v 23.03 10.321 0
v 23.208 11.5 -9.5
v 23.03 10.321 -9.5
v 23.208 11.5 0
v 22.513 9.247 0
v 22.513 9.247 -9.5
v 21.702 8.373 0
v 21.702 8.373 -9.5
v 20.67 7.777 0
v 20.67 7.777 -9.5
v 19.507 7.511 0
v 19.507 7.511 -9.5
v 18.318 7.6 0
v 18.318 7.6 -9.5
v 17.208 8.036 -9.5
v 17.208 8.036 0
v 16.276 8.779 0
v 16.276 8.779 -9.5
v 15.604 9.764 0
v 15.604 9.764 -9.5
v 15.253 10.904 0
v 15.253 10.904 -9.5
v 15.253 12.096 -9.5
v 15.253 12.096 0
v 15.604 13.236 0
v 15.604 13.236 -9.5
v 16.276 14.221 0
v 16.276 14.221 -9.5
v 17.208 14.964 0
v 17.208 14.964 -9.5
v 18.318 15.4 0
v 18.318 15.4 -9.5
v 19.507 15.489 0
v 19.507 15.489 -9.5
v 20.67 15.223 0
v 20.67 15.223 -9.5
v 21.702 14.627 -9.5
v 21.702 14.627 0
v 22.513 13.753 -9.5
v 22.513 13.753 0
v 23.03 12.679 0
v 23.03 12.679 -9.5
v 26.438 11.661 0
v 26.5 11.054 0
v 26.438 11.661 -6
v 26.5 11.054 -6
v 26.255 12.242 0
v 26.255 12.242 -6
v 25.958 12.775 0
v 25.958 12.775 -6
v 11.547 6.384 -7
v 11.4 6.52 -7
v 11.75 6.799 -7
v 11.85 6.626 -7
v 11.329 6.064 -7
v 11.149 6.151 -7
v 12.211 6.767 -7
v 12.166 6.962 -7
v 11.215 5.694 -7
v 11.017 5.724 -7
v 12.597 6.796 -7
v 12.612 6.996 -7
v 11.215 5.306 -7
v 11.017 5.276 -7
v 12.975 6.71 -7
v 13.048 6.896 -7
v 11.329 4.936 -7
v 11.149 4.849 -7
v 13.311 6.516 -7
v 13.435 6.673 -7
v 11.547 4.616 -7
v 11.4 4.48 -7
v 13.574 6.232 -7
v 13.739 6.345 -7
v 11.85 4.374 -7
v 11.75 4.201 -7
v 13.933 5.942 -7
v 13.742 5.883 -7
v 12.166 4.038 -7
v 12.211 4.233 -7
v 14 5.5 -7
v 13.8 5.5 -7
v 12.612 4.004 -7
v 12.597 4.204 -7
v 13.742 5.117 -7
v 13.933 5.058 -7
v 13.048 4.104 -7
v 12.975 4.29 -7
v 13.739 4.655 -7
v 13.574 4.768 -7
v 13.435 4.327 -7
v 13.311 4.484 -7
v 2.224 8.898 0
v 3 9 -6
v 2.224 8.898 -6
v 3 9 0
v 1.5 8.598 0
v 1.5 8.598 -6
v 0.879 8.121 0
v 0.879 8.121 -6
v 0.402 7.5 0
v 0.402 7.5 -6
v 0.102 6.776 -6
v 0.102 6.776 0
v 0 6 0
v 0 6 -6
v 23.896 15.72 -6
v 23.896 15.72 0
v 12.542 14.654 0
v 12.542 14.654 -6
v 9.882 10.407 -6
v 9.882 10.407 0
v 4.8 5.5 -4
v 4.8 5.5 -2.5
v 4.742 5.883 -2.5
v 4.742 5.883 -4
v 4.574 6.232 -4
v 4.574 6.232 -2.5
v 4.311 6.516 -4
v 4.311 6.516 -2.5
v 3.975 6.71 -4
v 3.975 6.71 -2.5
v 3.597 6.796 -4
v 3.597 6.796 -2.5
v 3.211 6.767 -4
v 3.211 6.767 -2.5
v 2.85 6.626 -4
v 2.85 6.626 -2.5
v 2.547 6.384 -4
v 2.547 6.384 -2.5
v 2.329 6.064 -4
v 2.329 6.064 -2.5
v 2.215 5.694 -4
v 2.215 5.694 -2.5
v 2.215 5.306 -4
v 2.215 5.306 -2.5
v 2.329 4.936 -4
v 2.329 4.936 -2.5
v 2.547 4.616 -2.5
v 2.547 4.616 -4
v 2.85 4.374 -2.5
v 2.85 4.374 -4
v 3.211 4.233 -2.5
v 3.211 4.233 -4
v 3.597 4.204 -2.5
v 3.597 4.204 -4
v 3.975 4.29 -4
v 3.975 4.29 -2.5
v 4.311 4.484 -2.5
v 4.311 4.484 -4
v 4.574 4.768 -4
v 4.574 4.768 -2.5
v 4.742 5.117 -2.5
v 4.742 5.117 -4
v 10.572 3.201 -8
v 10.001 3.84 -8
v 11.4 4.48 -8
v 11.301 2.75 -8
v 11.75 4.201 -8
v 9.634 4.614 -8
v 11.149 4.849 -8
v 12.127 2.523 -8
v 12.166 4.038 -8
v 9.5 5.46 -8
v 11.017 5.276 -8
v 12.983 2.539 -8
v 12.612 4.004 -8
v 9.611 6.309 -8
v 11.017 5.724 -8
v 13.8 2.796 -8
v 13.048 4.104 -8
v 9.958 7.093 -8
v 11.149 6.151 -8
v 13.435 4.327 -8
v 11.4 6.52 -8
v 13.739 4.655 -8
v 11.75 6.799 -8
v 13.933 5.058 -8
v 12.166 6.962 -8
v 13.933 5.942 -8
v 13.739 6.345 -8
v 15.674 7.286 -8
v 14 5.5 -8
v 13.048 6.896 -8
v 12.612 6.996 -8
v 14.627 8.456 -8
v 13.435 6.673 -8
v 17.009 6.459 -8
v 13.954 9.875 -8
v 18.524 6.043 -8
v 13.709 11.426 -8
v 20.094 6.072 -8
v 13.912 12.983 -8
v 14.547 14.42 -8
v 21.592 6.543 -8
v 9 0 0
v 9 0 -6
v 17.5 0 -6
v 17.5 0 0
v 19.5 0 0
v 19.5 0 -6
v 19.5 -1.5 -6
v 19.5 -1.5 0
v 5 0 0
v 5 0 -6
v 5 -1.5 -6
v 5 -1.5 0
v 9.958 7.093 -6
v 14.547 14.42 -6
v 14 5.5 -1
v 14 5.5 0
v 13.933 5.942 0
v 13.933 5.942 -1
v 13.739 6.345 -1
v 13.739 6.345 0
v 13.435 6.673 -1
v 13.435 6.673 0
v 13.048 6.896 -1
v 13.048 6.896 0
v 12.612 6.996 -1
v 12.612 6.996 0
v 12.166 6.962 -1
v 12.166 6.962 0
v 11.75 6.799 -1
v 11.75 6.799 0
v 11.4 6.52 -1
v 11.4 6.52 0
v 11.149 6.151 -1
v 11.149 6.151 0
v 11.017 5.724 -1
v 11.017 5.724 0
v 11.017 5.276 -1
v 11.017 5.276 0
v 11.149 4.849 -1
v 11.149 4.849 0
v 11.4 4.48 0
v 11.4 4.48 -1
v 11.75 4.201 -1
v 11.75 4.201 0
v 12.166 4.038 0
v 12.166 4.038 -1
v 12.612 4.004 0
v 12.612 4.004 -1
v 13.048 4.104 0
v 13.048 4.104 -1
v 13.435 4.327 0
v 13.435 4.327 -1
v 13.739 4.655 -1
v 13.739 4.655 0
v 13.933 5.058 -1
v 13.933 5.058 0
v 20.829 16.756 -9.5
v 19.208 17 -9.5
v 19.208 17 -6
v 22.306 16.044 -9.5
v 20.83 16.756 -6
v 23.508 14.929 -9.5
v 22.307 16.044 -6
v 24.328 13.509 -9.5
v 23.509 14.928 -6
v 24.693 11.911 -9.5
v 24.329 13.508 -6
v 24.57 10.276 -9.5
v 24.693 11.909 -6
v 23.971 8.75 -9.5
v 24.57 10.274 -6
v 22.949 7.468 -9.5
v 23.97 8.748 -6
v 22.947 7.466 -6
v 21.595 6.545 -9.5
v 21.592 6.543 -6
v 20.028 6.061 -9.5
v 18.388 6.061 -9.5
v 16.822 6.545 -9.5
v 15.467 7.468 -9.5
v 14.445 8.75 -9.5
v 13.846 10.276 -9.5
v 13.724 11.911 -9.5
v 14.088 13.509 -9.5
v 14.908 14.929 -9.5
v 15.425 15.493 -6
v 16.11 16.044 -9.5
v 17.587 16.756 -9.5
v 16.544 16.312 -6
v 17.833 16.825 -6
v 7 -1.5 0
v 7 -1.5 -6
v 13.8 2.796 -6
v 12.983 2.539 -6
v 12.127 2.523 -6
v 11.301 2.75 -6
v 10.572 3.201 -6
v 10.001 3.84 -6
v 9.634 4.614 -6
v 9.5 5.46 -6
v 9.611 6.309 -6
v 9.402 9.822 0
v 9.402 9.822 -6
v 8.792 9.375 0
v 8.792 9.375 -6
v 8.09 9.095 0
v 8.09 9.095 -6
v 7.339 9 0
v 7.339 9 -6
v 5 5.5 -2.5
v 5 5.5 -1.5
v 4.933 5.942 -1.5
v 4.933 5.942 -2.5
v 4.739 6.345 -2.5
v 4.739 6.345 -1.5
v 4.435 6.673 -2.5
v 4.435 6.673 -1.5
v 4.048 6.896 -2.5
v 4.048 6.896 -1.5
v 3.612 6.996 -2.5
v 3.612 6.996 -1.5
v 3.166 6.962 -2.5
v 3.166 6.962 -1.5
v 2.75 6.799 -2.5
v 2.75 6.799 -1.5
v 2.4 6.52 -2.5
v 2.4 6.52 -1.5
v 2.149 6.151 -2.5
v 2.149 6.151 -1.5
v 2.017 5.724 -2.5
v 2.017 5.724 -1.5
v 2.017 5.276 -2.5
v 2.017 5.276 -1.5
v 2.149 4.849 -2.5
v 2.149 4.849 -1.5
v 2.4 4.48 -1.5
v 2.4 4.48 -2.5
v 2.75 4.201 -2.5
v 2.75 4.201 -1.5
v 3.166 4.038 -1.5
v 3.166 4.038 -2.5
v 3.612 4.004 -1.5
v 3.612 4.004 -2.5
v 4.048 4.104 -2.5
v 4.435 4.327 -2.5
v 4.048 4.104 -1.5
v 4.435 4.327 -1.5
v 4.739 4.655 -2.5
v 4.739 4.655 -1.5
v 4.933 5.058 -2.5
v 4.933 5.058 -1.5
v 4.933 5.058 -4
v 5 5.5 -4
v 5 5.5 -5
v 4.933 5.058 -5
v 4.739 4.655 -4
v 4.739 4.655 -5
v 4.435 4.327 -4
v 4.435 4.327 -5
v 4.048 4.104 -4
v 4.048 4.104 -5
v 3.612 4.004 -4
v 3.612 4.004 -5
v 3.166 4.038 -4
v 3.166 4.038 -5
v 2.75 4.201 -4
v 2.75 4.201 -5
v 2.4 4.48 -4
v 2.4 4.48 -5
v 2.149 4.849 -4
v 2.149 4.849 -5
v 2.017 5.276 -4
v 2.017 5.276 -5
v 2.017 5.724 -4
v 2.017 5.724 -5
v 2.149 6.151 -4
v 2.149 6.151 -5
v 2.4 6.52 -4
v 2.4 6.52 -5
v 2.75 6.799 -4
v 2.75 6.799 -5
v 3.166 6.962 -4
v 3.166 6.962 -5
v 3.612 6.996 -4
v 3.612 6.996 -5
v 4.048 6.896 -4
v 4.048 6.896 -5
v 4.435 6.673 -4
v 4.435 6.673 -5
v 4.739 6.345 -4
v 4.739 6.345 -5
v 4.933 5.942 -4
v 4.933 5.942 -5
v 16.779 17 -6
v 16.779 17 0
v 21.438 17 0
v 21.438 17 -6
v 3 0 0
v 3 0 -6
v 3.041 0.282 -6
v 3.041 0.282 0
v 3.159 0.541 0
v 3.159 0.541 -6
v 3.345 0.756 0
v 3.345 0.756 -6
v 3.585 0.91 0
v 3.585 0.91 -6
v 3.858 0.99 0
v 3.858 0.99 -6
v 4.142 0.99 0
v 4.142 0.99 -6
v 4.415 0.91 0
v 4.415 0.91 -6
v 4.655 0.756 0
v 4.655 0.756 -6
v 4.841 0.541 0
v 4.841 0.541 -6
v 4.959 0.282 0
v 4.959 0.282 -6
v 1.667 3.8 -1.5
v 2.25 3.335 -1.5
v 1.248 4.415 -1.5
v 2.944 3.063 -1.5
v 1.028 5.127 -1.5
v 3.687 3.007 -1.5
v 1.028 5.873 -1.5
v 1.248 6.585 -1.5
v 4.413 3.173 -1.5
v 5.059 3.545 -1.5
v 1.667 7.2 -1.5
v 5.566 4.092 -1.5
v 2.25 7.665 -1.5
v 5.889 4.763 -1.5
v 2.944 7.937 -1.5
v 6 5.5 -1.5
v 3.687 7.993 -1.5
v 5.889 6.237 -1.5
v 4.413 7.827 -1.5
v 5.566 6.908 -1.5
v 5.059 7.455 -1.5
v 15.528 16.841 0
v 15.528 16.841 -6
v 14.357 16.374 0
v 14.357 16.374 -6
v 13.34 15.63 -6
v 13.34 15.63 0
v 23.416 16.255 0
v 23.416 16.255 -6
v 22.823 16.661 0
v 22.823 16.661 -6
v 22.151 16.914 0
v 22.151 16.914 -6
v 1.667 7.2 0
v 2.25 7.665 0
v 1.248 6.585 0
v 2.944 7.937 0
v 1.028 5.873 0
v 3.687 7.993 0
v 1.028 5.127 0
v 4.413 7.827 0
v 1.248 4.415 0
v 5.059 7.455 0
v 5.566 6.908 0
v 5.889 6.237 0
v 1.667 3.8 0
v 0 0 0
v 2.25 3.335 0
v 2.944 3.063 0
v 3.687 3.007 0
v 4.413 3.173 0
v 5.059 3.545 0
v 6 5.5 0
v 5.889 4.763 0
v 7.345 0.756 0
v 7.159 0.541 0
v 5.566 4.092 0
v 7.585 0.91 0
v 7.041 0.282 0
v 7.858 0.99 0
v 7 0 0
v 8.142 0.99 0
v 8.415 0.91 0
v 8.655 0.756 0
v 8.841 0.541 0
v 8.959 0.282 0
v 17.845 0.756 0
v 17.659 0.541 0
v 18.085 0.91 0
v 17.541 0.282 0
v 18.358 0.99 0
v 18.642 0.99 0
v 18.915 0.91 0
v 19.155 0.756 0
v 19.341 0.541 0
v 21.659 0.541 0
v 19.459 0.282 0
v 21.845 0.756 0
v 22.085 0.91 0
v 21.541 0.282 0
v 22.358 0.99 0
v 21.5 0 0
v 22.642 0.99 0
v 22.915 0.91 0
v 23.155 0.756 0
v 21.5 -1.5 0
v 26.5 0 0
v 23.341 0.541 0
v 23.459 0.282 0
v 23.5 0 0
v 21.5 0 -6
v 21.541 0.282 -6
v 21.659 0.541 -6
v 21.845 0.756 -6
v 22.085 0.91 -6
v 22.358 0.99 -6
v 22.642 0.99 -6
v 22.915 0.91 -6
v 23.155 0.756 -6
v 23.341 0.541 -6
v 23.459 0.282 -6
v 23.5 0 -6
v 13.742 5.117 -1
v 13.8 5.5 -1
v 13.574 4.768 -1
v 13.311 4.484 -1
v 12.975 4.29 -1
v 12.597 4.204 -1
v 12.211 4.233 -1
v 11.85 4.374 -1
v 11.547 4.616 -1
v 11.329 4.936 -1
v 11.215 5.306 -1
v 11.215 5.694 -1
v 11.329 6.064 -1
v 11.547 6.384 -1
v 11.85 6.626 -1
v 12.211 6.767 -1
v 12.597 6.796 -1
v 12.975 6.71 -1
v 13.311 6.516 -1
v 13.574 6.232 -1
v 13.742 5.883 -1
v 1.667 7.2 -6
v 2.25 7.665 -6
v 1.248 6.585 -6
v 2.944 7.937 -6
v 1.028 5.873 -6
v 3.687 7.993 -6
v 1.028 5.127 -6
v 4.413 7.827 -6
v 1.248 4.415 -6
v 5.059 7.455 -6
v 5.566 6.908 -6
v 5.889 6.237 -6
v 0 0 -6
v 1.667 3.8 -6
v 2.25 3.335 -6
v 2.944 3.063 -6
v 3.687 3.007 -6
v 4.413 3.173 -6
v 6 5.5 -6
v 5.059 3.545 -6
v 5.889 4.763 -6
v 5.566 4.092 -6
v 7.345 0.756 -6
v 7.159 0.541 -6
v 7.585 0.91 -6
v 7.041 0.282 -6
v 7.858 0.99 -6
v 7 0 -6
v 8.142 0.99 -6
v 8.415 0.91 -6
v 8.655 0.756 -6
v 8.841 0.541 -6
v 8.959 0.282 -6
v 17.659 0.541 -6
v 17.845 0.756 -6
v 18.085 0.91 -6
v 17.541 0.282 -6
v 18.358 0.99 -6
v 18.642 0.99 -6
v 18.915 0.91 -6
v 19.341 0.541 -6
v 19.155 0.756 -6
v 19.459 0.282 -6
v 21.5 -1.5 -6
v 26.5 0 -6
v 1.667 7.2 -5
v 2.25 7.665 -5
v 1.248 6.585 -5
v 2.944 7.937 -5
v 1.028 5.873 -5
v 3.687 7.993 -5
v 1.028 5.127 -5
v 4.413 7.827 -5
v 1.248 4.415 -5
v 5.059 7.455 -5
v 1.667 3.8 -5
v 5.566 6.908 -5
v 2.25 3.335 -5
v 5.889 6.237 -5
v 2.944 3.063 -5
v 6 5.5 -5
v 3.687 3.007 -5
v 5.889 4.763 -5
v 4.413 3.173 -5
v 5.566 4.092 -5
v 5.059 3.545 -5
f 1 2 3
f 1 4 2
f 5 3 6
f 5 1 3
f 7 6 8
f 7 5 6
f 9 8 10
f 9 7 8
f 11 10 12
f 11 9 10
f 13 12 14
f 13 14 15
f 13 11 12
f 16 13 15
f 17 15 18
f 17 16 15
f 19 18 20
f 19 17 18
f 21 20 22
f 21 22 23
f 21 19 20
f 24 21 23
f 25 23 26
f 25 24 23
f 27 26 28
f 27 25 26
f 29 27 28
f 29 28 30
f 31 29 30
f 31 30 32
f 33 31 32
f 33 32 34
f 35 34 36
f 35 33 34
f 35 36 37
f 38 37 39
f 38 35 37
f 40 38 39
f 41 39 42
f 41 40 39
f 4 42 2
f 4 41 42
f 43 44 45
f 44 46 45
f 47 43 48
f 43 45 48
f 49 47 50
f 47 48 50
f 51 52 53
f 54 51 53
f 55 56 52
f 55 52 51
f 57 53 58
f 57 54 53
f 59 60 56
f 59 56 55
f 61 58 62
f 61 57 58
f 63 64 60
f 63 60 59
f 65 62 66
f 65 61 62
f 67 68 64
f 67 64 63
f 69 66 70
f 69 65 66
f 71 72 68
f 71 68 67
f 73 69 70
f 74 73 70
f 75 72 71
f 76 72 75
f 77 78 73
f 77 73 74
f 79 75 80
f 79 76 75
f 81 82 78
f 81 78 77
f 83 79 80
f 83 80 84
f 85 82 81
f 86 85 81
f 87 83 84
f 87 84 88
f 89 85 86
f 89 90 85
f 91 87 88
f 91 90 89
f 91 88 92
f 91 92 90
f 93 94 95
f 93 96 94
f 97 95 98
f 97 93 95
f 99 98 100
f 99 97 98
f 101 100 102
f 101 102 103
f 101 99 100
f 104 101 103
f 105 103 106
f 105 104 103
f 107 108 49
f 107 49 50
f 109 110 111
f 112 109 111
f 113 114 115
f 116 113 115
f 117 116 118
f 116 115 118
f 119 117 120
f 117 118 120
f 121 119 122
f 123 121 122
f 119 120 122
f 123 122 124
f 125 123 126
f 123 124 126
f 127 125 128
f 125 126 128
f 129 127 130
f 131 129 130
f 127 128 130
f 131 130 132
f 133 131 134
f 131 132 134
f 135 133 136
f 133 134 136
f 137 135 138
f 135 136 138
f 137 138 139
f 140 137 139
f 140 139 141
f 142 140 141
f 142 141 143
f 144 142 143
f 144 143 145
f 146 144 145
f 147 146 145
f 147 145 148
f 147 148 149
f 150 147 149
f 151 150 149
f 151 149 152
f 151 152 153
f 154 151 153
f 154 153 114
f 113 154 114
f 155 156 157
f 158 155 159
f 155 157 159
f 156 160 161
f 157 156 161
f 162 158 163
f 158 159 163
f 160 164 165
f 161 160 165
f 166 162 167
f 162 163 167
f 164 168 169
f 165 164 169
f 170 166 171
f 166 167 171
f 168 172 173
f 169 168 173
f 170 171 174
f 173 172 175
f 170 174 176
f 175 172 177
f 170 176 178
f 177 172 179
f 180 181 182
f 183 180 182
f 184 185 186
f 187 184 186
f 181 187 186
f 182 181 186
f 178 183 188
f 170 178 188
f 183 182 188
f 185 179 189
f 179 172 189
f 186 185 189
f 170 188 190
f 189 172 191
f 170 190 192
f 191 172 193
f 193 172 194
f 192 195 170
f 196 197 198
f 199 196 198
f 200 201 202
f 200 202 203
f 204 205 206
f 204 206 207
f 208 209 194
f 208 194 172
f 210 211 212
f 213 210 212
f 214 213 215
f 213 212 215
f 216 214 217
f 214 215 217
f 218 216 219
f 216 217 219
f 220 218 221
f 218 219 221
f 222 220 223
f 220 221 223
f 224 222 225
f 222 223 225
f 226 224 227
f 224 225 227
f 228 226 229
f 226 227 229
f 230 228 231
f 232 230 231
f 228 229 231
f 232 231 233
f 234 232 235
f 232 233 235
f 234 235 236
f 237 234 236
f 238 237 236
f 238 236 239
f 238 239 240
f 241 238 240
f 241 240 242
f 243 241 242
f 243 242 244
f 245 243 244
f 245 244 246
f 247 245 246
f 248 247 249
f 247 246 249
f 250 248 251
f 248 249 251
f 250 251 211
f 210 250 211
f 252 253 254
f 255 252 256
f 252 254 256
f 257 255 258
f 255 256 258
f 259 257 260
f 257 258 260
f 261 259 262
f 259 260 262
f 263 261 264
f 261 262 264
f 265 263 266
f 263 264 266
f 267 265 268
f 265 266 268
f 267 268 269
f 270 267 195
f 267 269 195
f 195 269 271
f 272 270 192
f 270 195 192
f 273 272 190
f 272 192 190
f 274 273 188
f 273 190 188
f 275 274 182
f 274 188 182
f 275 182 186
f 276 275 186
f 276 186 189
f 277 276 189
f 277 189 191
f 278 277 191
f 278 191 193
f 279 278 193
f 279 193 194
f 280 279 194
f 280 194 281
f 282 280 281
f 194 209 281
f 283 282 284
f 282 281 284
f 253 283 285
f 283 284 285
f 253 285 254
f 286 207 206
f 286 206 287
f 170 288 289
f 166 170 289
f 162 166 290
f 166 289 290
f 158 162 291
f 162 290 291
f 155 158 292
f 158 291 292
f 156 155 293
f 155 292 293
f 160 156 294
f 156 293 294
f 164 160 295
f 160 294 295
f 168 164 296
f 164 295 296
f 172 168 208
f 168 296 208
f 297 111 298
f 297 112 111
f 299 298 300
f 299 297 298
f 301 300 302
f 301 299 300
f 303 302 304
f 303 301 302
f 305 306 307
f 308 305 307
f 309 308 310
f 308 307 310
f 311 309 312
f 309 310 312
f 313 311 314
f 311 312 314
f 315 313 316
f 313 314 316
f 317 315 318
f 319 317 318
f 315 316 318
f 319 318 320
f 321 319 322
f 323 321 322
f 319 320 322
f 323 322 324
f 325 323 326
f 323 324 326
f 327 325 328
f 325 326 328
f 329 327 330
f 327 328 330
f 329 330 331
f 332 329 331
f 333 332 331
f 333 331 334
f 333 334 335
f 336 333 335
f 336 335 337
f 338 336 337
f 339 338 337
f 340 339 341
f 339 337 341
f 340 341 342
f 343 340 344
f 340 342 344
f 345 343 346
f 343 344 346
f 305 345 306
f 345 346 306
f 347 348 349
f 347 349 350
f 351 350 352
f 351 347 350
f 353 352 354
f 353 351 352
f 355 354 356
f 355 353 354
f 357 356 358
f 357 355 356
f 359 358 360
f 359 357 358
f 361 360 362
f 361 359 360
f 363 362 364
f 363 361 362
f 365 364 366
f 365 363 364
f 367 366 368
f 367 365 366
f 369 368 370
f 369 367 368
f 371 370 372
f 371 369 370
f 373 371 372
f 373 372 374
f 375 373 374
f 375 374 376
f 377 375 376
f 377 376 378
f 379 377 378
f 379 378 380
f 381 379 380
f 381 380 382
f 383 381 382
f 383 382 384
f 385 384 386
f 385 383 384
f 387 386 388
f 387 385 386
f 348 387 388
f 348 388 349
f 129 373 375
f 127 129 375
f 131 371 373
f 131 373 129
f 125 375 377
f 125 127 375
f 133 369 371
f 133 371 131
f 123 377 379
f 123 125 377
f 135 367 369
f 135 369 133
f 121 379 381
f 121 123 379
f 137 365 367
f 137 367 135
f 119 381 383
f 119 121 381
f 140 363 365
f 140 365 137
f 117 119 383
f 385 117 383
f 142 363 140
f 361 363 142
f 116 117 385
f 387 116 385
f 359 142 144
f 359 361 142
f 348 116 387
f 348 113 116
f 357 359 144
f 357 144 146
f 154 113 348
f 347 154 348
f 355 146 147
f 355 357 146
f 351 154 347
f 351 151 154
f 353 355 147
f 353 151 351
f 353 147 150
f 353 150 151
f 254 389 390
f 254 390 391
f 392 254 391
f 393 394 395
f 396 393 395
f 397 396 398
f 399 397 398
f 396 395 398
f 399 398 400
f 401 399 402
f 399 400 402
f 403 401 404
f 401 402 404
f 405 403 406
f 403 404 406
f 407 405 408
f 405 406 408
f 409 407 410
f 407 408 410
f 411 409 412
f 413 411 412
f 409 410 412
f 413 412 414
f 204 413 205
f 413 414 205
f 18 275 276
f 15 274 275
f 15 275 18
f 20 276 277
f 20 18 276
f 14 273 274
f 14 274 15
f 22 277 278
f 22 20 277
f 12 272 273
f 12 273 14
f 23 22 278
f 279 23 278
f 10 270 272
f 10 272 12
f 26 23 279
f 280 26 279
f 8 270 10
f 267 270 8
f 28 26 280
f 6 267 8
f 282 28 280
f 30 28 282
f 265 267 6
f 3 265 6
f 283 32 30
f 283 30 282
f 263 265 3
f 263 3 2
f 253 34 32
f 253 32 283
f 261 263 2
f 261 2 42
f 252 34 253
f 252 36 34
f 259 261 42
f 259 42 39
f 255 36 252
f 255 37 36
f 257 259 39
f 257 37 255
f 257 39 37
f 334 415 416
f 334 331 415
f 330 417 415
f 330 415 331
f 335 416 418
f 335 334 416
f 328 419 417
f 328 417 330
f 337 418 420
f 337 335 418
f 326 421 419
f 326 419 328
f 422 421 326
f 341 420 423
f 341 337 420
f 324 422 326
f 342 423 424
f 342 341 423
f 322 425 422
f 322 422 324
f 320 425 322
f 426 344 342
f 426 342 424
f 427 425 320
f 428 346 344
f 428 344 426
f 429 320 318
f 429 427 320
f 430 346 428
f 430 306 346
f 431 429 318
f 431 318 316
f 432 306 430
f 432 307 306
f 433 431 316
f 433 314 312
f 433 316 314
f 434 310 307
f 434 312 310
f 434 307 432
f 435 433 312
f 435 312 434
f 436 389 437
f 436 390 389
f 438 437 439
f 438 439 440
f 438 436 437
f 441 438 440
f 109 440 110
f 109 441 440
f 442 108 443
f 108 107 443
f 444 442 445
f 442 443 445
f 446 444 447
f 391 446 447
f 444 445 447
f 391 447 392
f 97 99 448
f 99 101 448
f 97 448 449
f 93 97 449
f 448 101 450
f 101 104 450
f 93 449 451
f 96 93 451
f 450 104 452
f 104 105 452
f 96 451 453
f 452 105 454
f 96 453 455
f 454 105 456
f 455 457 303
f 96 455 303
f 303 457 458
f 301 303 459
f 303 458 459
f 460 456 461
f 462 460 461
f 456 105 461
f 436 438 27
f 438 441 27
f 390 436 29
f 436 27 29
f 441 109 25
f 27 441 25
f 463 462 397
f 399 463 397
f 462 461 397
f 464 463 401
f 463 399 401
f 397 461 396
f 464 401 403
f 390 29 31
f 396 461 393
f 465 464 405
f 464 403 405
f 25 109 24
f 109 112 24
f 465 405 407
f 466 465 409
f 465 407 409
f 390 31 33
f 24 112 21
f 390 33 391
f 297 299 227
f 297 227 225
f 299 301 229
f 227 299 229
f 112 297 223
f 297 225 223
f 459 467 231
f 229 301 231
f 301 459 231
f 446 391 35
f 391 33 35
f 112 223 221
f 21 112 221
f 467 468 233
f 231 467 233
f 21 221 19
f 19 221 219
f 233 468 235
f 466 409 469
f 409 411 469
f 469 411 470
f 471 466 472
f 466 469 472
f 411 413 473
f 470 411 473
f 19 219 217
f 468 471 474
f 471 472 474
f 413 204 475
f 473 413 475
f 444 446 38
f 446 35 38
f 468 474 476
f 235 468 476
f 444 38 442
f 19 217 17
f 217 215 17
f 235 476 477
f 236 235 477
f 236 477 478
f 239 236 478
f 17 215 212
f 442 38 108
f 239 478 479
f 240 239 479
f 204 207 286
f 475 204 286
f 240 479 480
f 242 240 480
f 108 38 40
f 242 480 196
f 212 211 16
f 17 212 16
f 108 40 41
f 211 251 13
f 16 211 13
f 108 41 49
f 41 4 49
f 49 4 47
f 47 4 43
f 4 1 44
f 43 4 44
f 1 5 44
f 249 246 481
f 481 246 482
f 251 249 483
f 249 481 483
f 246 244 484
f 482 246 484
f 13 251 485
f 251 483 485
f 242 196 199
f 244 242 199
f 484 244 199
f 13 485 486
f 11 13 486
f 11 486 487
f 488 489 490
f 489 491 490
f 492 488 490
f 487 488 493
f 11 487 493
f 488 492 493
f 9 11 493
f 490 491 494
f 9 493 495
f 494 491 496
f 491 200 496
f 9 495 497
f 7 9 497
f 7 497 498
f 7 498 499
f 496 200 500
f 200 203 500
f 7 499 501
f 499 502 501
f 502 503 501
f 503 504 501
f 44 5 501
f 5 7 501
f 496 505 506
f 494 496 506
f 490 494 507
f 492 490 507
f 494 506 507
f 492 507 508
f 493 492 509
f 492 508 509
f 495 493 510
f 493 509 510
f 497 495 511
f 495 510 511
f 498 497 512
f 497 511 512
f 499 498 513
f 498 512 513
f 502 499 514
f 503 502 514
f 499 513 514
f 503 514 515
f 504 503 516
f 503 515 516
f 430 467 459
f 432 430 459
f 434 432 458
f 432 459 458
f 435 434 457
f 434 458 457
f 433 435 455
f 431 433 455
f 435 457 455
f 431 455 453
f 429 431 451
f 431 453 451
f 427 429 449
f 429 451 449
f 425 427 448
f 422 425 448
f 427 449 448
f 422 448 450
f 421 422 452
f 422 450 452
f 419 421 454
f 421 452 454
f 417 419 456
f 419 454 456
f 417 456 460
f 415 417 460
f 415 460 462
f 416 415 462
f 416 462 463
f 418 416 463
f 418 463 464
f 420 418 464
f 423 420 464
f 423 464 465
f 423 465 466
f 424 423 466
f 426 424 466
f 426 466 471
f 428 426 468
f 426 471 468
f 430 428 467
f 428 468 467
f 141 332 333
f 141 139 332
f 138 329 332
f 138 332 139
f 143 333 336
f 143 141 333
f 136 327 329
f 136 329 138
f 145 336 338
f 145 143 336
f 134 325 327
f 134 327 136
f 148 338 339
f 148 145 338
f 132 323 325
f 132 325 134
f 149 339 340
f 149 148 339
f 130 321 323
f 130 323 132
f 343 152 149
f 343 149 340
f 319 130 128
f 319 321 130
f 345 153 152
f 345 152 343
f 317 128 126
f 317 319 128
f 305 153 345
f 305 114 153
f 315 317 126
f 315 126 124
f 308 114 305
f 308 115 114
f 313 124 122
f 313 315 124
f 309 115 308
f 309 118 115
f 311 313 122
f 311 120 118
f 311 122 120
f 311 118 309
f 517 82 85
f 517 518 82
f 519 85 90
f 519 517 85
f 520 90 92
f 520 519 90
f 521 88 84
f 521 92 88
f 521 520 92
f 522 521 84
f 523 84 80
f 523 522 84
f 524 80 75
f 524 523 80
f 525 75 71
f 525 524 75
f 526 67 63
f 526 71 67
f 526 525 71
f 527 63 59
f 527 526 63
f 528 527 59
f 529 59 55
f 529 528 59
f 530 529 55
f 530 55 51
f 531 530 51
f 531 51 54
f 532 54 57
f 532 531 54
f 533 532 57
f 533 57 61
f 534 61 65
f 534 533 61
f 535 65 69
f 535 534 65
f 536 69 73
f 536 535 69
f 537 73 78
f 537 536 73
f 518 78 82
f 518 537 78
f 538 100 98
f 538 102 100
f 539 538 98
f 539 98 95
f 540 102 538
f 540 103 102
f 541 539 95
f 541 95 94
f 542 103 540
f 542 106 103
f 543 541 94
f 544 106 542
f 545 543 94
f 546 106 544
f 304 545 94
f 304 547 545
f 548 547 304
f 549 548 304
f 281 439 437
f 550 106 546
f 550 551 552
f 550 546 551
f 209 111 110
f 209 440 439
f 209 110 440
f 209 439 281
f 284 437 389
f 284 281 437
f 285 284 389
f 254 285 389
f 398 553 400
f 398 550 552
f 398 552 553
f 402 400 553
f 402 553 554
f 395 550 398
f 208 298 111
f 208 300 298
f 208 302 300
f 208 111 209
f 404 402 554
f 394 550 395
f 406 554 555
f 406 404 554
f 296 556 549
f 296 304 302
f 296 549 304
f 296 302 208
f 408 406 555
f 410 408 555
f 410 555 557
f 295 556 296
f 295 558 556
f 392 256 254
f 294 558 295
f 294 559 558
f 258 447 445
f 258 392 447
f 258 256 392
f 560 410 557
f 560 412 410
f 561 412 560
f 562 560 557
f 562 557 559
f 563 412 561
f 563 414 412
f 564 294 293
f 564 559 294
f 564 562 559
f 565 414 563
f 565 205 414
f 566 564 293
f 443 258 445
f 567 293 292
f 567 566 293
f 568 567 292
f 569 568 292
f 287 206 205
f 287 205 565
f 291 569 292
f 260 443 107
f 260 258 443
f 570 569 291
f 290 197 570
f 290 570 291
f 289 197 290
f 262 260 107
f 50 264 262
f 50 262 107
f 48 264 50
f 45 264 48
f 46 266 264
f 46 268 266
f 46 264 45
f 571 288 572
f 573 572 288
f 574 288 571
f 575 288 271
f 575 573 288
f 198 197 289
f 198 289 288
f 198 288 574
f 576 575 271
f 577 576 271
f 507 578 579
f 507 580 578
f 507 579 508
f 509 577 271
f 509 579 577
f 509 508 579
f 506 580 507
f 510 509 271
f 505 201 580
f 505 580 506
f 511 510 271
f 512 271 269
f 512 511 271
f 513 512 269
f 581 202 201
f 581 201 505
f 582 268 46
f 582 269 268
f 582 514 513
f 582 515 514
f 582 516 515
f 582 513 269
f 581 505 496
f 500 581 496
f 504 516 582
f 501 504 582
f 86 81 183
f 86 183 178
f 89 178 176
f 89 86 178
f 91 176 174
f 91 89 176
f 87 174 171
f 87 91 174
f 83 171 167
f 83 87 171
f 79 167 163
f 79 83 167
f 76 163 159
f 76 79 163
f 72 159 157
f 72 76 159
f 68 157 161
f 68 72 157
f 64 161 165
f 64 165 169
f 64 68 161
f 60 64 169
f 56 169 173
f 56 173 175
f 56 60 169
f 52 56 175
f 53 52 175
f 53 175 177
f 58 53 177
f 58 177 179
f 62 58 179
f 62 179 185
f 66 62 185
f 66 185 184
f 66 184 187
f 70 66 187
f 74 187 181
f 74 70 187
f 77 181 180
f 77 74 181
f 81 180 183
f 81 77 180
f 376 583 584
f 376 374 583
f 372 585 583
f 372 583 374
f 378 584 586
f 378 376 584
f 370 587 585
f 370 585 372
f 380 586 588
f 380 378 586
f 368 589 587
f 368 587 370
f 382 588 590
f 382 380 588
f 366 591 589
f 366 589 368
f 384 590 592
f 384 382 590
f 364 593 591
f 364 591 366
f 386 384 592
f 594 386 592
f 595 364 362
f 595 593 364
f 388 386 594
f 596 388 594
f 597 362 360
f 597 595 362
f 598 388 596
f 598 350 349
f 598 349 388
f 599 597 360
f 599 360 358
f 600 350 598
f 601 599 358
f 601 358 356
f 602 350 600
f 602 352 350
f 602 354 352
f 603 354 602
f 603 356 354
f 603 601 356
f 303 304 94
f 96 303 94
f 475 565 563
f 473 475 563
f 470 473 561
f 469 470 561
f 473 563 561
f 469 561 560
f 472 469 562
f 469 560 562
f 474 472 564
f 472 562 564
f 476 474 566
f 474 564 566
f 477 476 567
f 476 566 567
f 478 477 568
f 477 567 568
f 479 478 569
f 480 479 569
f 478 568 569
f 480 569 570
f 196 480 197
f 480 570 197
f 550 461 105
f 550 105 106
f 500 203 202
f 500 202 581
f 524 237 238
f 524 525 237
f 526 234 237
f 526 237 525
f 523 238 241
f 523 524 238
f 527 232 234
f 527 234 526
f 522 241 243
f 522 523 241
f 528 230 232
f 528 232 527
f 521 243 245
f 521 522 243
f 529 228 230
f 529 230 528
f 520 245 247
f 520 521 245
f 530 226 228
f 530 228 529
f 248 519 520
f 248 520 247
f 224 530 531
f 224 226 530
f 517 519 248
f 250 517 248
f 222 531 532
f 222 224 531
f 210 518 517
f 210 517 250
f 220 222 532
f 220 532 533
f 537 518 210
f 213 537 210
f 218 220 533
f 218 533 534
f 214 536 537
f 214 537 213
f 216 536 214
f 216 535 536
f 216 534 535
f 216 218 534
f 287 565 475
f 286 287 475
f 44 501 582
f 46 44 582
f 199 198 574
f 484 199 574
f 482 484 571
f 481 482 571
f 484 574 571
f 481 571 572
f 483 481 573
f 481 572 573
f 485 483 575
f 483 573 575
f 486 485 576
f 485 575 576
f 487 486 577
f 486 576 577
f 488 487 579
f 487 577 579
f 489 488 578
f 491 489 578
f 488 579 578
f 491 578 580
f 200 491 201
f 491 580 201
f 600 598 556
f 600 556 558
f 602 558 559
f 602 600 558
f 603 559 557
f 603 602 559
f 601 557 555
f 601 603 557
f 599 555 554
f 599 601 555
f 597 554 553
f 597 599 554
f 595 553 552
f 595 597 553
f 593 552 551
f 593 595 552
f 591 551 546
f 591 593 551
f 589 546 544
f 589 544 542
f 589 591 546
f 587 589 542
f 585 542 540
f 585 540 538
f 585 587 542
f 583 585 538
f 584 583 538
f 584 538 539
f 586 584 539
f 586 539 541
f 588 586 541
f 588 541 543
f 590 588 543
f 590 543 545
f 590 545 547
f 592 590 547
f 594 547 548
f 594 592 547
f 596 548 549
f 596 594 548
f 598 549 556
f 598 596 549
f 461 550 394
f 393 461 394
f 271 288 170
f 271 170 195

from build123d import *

# Parameters (mm, degrees)
SKETCH1_W           = 26.5
SKETCH1_H           = 6
BOSS_EXTRUDE1_DEPTH = 17
SKETCH2_R           = 1.5
CUT_EXTRUDE1_DEPTH  = 1
SKETCH3_R           = 1.3
CUT_EXTRUDE2_DEPTH  = 32.878676259
SKETCH4_R           = 4
CUT_EXTRUDE3_DEPTH  = 33.050741021
SKETCH5_R           = 2.5
CUT_EXTRUDE4_DEPTH  = 1.5
SKETCH6_R           = 1.5
CUT_EXTRUDE8_DEPTH  = 1
SKETCH7_R           = 1.3
CUT_EXTRUDE9_DEPTH  = 32.678068123
CUT_EXTRUDE10_START = -1
SKETCH8_R           = 2.5
CUT_EXTRUDE10_DEPTH = 1
CUT_EXTRUDE11_START = -1
SKETCH9_R           = 1.5
CUT_EXTRUDE11_DEPTH = 1
SKETCH10_R          = 5.5
SKETCH10_R_2        = 4
BOSS_EXTRUDE2_DEPTH = 3.5
SKETCH11_R          = 3
SKETCH11_R_2        = 1.3
BOSS_EXTRUDE4_DEPTH = 2
CUT_EXTRUDE12_START = -1
SKETCH12_R          = 1.5
CUT_EXTRUDE12_DEPTH = 1
SKETCH17_W          = 2
SKETCH17_H          = 6
BOSS_EXTRUDE6_DEPTH = 1.5
SKETCH18_R          = 1
CUT_EXTRUDE17_DEPTH = 33.050741021
CHAMFER2_SIZE       = 5
CHAMFER2_SIZE2      = 3.5
FILLET11_R          = 3
BOSS_EXTRUDE7_DEPTH = 2
CUT_EXTRUDE19_DEPTH = 33.050741021
FILLET13_R          = 5
FILLET14_R          = 3
FILLET15_R          = 3


with BuildPart() as part:
    # Sketch1 → Boss-Extrude1 (new body)
    with BuildSketch(Plane(origin=(0, 0, 0), x_dir=(1, 0, 0), z_dir=(0, 1, 0))):
        with Locations((13.25, 3)):
            Rectangle(SKETCH1_W, SKETCH1_H)
    extrude(amount=BOSS_EXTRUDE1_DEPTH)

    # Sketch2 → Cut-Extrude1 (cut)
    with BuildSketch(Plane.XY):
        with Locations((12.5, 5.5)):
            Circle(SKETCH2_R)
    extrude(amount=-CUT_EXTRUDE1_DEPTH, mode=Mode.SUBTRACT)

    # Sketch3 → Cut-Extrude2 (cut, through all)
    with BuildSketch(Plane.XY.offset(-1)):
        with Locations((12.5, 5.5)):
            Circle(SKETCH3_R)
    extrude(amount=-CUT_EXTRUDE2_DEPTH, mode=Mode.SUBTRACT)

    # Sketch4 → Cut-Extrude3 (cut, through all)
    with BuildSketch(Plane.XY):
        with Locations((19.208203932, 11.5)):
            Circle(SKETCH4_R)
    extrude(amount=-CUT_EXTRUDE3_DEPTH, mode=Mode.SUBTRACT)

    # Sketch5 → Cut-Extrude4 (cut)
    with BuildSketch(Plane.XY):
        with Locations((3.5, 5.5)):
            Circle(SKETCH5_R)
    extrude(amount=-CUT_EXTRUDE4_DEPTH, mode=Mode.SUBTRACT)

    # Sketch6 → Cut-Extrude8 (cut)
    with BuildSketch(Plane.XY.offset(-1.5)):
        with Locations((3.5, 5.5)):
            Circle(SKETCH6_R)
    extrude(amount=-CUT_EXTRUDE8_DEPTH, mode=Mode.SUBTRACT)

    # Sketch7 → Cut-Extrude9 (cut, through all)
    with BuildSketch(Plane.XY.offset(-2.5)):
        with Locations((3.5, 5.5)):
            Circle(SKETCH7_R)
    extrude(amount=-CUT_EXTRUDE9_DEPTH, mode=Mode.SUBTRACT)

    # Sketch8 → Cut-Extrude10 (cut)
    with BuildSketch(Plane(origin=(0, 0, -6), x_dir=(-1, 0, 0), z_dir=(0, 0, -1)).offset(CUT_EXTRUDE10_START)):
        with Locations(Location((-3.5, 5.5, 0), (0, 0, 180))):
            Circle(SKETCH8_R)
    extrude(amount=CUT_EXTRUDE10_DEPTH, mode=Mode.SUBTRACT)

    # Sketch9 → Cut-Extrude11 (cut)
    with BuildSketch(Plane(origin=(0, 0, -5), x_dir=(-1, 0, 0), z_dir=(0, 0, -1)).offset(CUT_EXTRUDE11_START)):
        with Locations(Location((-3.5, 5.5, 0), (0, 0, 180))):
            Circle(SKETCH9_R)
    extrude(amount=CUT_EXTRUDE11_DEPTH, mode=Mode.SUBTRACT)

    # Sketch10 → Boss-Extrude2 (add)
    with BuildSketch(Plane(origin=(0, 0, -6), x_dir=(-1, 0, 0), z_dir=(0, 0, -1))):
        with Locations(Location((-19.208203932, 11.5, 0), (0, 0, 90))):
            Circle(SKETCH10_R)
        with Locations(Location((-19.208203932, 11.5, 0), (0, 0, 180))):
            Circle(SKETCH10_R_2, mode=Mode.SUBTRACT)
    extrude(amount=BOSS_EXTRUDE2_DEPTH)

    # Sketch11 → Boss-Extrude4 (add)
    with BuildSketch(Plane(origin=(0, 0, -6), x_dir=(-1, 0, 0), z_dir=(0, 0, -1))):
        with Locations(Location((-12.5, 5.5, 0), (0, 0, 180))):
            Circle(SKETCH11_R)
        with Locations(Location((-12.5, 5.5, 0), (0, 0, 180))):
            Circle(SKETCH11_R_2, mode=Mode.SUBTRACT)
    extrude(amount=BOSS_EXTRUDE4_DEPTH)

    # Sketch12 → Cut-Extrude12 (cut)
    with BuildSketch(Plane(origin=(0, 0, -8), x_dir=(-1, 0, 0), z_dir=(0, 0, -1)).offset(CUT_EXTRUDE12_START)):
        with Locations(Location((-12.5, 5.5, 0), (0, 0, 180))):
            Circle(SKETCH12_R)
    extrude(amount=CUT_EXTRUDE12_DEPTH, mode=Mode.SUBTRACT)

    # Sketch17 → Boss-Extrude6 (add)
    with BuildSketch(Plane.XZ):
        with Locations((6, -3)):
            Rectangle(SKETCH17_W, SKETCH17_H)
        with Locations((20.5, -3)):
            Rectangle(SKETCH17_W, SKETCH17_H)
    extrude(amount=BOSS_EXTRUDE6_DEPTH)

    # Sketch18 → Cut-Extrude17 (cut, through all)
    with BuildSketch(Plane(origin=(0, 0, -6), x_dir=(-1, 0, 0), z_dir=(0, 0, -1))):
        with Locations((-22.5, 0)):
            Circle(SKETCH18_R)
        with Locations((-18.5, 0)):
            Circle(SKETCH18_R)
        with Locations((-8, 0)):
            Circle(SKETCH18_R)
        with Locations((-4, 0)):
            Circle(SKETCH18_R)
    extrude(amount=-CUT_EXTRUDE17_DEPTH, mode=Mode.SUBTRACT)

    # Chamfer2
    chamfer2_edges = [part.edges().sort_by_distance(p)[0] for p in [
        (26.5, 17, -3),
    ]]
    chamfer2_side = [part.faces().sort_by_distance(p)[0] for p in [
        (26.5, 8.5, -3),
    ]]
    chamfer(chamfer2_edges, length=CHAMFER2_SIZE, length2=CHAMFER2_SIZE2, reference=chamfer2_side[0])

    # Fillet11
    fillet11_edges = [part.edges().sort_by_distance(p)[0] for p in [
        (23, 17, -3),
        (26.5, 12, -3),
    ]]
    fillet(fillet11_edges, radius=FILLET11_R)

    # Sketch19 → Boss-Extrude7 (add)
    with BuildSketch(Plane(origin=(0, 0, -6), x_dir=(-1, 0, 0), z_dir=(0, 0, -1))):
        with BuildLine():
            Line((-14.547099294, 14.419606745), (-9.957579288, 7.09251277))
            ThreePointArc((-9.957579288, 7.09251277), (-14.736067977, 7.5), (-13.800160725, 2.796376119))
            Line((-13.800160725, 2.796376119), (-21.591831928, 6.543356218))
            ThreePointArc((-21.591831928, 6.543356218), (-15.108745974, 7.833333333), (-14.547099294, 14.419606745))
        make_face()
    extrude(amount=BOSS_EXTRUDE7_DEPTH)

    # Sketch20 → Cut-Extrude19 (cut, through all)
    with BuildSketch(Plane(origin=(0, 0, -6), x_dir=(-1, 0, 0), z_dir=(0, 0, -1))):
        Polygon((0, 17), (-14.011012575, 17), (-9, 9), (0, 9), align=None)
    extrude(amount=-CUT_EXTRUDE19_DEPTH, mode=Mode.SUBTRACT)

    # Fillet13
    fillet13_edges = [part.edges().sort_by_distance(p)[0] for p in [
        (14.011012575, 17, -3),
    ]]
    fillet(fillet13_edges, radius=FILLET13_R)

    # Fillet14
    fillet14_edges = [part.edges().sort_by_distance(p)[0] for p in [
        (9, 9, -3),
    ]]
    fillet(fillet14_edges, radius=FILLET14_R)

    # Fillet15
    fillet15_edges = [part.edges().sort_by_distance(p)[0] for p in [
        (0, 9, -3),
    ]]
    fillet(fillet15_edges, radius=FILLET15_R)


solid = part.part
